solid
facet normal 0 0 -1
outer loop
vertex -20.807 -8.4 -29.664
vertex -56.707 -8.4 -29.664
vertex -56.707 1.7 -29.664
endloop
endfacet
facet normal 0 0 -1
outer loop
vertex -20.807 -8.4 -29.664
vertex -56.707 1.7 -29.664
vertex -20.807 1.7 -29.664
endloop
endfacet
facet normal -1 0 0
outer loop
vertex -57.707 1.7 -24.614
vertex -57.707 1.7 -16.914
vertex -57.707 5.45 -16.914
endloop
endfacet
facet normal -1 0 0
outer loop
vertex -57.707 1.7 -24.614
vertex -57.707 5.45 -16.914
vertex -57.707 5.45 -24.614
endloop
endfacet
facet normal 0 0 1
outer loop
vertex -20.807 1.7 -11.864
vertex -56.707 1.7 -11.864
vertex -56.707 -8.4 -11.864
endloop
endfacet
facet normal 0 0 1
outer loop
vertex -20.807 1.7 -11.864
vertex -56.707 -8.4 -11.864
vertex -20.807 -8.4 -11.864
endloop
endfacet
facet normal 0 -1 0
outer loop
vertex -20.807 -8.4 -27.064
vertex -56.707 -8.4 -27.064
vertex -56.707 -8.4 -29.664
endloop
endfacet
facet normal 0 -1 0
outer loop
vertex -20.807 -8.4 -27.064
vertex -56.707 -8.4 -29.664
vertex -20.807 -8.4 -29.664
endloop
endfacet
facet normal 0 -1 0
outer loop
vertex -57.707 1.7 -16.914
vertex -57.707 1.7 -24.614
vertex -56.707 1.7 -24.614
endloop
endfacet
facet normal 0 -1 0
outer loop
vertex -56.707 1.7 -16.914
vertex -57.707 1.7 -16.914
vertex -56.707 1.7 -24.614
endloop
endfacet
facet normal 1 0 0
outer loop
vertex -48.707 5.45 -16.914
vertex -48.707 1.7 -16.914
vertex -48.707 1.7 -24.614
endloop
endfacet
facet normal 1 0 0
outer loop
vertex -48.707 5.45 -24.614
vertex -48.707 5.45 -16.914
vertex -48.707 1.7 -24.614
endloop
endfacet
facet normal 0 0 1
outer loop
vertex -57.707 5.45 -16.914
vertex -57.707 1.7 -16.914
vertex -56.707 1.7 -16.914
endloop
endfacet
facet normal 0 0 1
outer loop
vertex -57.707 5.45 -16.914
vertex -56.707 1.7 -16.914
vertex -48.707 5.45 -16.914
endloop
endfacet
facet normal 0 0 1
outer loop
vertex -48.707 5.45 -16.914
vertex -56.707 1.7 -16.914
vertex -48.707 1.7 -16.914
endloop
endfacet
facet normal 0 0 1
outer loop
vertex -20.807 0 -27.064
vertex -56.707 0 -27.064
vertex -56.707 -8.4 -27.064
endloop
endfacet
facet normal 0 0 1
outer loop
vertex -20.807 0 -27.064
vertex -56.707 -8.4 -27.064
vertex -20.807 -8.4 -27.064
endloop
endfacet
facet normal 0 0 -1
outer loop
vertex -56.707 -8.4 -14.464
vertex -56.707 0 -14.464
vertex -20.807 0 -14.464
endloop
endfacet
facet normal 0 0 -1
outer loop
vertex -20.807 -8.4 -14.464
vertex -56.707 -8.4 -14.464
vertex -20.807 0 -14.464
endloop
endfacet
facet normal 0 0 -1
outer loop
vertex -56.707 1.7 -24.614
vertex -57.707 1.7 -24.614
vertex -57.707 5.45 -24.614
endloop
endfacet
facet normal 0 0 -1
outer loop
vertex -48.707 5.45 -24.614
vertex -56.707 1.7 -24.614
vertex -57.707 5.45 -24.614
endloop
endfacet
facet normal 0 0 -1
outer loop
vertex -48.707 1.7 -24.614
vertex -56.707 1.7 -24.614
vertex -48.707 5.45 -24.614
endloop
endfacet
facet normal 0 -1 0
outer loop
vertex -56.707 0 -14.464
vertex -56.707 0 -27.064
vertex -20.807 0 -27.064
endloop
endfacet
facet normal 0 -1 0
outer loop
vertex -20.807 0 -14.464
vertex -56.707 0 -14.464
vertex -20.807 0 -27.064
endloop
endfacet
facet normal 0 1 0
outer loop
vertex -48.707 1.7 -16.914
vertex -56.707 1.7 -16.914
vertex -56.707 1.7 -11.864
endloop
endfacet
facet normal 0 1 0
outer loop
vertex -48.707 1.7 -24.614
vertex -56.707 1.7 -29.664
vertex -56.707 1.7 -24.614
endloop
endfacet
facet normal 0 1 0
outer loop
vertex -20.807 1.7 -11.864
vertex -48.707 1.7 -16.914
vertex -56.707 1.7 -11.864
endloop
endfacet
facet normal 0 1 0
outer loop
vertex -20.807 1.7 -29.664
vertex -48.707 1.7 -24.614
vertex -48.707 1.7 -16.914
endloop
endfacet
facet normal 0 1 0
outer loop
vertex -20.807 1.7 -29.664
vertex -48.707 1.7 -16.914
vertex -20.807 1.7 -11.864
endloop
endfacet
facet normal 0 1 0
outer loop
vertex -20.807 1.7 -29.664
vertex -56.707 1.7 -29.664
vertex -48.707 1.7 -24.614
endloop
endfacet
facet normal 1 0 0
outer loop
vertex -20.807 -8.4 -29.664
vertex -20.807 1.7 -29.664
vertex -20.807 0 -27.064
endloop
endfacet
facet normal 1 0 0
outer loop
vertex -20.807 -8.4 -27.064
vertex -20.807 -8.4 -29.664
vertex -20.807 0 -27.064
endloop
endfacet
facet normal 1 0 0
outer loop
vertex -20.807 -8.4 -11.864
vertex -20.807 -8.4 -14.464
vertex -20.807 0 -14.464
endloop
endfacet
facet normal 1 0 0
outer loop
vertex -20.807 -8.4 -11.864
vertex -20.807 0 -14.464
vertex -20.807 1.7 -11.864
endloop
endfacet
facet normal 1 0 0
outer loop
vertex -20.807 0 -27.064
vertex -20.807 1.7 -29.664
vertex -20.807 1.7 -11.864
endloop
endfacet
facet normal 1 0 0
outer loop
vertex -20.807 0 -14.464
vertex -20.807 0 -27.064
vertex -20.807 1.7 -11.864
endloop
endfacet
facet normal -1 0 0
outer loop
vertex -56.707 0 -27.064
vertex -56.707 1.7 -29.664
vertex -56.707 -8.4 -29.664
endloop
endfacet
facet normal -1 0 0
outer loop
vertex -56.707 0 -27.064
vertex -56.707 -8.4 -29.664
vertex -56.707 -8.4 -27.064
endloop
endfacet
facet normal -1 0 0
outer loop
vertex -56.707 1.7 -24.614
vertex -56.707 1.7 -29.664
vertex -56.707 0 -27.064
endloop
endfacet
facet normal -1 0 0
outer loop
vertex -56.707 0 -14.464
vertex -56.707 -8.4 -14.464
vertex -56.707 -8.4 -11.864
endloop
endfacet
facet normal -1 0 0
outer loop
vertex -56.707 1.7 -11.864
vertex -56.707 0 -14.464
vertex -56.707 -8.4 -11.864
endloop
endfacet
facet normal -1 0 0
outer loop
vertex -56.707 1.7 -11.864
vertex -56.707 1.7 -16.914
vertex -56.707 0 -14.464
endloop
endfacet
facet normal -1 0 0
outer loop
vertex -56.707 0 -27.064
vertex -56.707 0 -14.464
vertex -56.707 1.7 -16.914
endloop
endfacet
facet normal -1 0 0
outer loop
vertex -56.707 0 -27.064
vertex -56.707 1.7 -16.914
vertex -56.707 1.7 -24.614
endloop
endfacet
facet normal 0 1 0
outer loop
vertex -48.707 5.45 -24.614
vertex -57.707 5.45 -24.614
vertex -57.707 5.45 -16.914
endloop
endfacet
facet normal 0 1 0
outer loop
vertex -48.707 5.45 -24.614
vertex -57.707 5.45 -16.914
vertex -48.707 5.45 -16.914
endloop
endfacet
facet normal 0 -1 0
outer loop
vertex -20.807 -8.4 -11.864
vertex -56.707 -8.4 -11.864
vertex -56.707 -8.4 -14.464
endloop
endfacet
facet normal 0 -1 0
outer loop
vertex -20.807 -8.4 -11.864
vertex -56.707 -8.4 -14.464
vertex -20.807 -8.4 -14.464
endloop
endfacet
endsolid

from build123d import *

# Parameters (mm, degrees)
SKETCH1_W      = 35.9
SKETCH1_H      = 17.8
EXTRUDE1_DEPTH = 1.7
SKETCH2_W      = 9
SKETCH2_H      = 7.7
EXTRUDE2_DEPTH = 3.75
SKETCH3_W      = 35.9
SKETCH3_H      = 2.6
EXTRUDE3_DEPTH = 8.4


with BuildPart() as part:
    # Sketch1 → Extrude1 (new body)
    with BuildSketch(Plane(origin=(0, 0, 0), x_dir=(1, 0, 0), z_dir=(0, 1, 0))):
        with Locations((-38.756784273, 20.763622827)):
            Rectangle(SKETCH1_W, SKETCH1_H)
    extrude(amount=EXTRUDE1_DEPTH)

    # Sketch2 → Extrude2 (add)
    with BuildSketch(Plane(origin=(0, 1.7, 0), x_dir=(1, 0, 0), z_dir=(0, 1, 0))):
        with Locations((-53.206784273, 20.763622827)):
            Rectangle(SKETCH2_W, SKETCH2_H)
    extrude(amount=EXTRUDE2_DEPTH)

    # Sketch3 → Extrude3 (add)
    with BuildSketch(Plane.XZ):
        with Locations((-38.756784273, -13.163622827)):
            Rectangle(SKETCH3_W, SKETCH3_H)
        with Locations((-38.756784273, -28.363622827)):
            Rectangle(SKETCH3_W, SKETCH3_H)
    extrude(amount=EXTRUDE3_DEPTH)


solid = part.part
